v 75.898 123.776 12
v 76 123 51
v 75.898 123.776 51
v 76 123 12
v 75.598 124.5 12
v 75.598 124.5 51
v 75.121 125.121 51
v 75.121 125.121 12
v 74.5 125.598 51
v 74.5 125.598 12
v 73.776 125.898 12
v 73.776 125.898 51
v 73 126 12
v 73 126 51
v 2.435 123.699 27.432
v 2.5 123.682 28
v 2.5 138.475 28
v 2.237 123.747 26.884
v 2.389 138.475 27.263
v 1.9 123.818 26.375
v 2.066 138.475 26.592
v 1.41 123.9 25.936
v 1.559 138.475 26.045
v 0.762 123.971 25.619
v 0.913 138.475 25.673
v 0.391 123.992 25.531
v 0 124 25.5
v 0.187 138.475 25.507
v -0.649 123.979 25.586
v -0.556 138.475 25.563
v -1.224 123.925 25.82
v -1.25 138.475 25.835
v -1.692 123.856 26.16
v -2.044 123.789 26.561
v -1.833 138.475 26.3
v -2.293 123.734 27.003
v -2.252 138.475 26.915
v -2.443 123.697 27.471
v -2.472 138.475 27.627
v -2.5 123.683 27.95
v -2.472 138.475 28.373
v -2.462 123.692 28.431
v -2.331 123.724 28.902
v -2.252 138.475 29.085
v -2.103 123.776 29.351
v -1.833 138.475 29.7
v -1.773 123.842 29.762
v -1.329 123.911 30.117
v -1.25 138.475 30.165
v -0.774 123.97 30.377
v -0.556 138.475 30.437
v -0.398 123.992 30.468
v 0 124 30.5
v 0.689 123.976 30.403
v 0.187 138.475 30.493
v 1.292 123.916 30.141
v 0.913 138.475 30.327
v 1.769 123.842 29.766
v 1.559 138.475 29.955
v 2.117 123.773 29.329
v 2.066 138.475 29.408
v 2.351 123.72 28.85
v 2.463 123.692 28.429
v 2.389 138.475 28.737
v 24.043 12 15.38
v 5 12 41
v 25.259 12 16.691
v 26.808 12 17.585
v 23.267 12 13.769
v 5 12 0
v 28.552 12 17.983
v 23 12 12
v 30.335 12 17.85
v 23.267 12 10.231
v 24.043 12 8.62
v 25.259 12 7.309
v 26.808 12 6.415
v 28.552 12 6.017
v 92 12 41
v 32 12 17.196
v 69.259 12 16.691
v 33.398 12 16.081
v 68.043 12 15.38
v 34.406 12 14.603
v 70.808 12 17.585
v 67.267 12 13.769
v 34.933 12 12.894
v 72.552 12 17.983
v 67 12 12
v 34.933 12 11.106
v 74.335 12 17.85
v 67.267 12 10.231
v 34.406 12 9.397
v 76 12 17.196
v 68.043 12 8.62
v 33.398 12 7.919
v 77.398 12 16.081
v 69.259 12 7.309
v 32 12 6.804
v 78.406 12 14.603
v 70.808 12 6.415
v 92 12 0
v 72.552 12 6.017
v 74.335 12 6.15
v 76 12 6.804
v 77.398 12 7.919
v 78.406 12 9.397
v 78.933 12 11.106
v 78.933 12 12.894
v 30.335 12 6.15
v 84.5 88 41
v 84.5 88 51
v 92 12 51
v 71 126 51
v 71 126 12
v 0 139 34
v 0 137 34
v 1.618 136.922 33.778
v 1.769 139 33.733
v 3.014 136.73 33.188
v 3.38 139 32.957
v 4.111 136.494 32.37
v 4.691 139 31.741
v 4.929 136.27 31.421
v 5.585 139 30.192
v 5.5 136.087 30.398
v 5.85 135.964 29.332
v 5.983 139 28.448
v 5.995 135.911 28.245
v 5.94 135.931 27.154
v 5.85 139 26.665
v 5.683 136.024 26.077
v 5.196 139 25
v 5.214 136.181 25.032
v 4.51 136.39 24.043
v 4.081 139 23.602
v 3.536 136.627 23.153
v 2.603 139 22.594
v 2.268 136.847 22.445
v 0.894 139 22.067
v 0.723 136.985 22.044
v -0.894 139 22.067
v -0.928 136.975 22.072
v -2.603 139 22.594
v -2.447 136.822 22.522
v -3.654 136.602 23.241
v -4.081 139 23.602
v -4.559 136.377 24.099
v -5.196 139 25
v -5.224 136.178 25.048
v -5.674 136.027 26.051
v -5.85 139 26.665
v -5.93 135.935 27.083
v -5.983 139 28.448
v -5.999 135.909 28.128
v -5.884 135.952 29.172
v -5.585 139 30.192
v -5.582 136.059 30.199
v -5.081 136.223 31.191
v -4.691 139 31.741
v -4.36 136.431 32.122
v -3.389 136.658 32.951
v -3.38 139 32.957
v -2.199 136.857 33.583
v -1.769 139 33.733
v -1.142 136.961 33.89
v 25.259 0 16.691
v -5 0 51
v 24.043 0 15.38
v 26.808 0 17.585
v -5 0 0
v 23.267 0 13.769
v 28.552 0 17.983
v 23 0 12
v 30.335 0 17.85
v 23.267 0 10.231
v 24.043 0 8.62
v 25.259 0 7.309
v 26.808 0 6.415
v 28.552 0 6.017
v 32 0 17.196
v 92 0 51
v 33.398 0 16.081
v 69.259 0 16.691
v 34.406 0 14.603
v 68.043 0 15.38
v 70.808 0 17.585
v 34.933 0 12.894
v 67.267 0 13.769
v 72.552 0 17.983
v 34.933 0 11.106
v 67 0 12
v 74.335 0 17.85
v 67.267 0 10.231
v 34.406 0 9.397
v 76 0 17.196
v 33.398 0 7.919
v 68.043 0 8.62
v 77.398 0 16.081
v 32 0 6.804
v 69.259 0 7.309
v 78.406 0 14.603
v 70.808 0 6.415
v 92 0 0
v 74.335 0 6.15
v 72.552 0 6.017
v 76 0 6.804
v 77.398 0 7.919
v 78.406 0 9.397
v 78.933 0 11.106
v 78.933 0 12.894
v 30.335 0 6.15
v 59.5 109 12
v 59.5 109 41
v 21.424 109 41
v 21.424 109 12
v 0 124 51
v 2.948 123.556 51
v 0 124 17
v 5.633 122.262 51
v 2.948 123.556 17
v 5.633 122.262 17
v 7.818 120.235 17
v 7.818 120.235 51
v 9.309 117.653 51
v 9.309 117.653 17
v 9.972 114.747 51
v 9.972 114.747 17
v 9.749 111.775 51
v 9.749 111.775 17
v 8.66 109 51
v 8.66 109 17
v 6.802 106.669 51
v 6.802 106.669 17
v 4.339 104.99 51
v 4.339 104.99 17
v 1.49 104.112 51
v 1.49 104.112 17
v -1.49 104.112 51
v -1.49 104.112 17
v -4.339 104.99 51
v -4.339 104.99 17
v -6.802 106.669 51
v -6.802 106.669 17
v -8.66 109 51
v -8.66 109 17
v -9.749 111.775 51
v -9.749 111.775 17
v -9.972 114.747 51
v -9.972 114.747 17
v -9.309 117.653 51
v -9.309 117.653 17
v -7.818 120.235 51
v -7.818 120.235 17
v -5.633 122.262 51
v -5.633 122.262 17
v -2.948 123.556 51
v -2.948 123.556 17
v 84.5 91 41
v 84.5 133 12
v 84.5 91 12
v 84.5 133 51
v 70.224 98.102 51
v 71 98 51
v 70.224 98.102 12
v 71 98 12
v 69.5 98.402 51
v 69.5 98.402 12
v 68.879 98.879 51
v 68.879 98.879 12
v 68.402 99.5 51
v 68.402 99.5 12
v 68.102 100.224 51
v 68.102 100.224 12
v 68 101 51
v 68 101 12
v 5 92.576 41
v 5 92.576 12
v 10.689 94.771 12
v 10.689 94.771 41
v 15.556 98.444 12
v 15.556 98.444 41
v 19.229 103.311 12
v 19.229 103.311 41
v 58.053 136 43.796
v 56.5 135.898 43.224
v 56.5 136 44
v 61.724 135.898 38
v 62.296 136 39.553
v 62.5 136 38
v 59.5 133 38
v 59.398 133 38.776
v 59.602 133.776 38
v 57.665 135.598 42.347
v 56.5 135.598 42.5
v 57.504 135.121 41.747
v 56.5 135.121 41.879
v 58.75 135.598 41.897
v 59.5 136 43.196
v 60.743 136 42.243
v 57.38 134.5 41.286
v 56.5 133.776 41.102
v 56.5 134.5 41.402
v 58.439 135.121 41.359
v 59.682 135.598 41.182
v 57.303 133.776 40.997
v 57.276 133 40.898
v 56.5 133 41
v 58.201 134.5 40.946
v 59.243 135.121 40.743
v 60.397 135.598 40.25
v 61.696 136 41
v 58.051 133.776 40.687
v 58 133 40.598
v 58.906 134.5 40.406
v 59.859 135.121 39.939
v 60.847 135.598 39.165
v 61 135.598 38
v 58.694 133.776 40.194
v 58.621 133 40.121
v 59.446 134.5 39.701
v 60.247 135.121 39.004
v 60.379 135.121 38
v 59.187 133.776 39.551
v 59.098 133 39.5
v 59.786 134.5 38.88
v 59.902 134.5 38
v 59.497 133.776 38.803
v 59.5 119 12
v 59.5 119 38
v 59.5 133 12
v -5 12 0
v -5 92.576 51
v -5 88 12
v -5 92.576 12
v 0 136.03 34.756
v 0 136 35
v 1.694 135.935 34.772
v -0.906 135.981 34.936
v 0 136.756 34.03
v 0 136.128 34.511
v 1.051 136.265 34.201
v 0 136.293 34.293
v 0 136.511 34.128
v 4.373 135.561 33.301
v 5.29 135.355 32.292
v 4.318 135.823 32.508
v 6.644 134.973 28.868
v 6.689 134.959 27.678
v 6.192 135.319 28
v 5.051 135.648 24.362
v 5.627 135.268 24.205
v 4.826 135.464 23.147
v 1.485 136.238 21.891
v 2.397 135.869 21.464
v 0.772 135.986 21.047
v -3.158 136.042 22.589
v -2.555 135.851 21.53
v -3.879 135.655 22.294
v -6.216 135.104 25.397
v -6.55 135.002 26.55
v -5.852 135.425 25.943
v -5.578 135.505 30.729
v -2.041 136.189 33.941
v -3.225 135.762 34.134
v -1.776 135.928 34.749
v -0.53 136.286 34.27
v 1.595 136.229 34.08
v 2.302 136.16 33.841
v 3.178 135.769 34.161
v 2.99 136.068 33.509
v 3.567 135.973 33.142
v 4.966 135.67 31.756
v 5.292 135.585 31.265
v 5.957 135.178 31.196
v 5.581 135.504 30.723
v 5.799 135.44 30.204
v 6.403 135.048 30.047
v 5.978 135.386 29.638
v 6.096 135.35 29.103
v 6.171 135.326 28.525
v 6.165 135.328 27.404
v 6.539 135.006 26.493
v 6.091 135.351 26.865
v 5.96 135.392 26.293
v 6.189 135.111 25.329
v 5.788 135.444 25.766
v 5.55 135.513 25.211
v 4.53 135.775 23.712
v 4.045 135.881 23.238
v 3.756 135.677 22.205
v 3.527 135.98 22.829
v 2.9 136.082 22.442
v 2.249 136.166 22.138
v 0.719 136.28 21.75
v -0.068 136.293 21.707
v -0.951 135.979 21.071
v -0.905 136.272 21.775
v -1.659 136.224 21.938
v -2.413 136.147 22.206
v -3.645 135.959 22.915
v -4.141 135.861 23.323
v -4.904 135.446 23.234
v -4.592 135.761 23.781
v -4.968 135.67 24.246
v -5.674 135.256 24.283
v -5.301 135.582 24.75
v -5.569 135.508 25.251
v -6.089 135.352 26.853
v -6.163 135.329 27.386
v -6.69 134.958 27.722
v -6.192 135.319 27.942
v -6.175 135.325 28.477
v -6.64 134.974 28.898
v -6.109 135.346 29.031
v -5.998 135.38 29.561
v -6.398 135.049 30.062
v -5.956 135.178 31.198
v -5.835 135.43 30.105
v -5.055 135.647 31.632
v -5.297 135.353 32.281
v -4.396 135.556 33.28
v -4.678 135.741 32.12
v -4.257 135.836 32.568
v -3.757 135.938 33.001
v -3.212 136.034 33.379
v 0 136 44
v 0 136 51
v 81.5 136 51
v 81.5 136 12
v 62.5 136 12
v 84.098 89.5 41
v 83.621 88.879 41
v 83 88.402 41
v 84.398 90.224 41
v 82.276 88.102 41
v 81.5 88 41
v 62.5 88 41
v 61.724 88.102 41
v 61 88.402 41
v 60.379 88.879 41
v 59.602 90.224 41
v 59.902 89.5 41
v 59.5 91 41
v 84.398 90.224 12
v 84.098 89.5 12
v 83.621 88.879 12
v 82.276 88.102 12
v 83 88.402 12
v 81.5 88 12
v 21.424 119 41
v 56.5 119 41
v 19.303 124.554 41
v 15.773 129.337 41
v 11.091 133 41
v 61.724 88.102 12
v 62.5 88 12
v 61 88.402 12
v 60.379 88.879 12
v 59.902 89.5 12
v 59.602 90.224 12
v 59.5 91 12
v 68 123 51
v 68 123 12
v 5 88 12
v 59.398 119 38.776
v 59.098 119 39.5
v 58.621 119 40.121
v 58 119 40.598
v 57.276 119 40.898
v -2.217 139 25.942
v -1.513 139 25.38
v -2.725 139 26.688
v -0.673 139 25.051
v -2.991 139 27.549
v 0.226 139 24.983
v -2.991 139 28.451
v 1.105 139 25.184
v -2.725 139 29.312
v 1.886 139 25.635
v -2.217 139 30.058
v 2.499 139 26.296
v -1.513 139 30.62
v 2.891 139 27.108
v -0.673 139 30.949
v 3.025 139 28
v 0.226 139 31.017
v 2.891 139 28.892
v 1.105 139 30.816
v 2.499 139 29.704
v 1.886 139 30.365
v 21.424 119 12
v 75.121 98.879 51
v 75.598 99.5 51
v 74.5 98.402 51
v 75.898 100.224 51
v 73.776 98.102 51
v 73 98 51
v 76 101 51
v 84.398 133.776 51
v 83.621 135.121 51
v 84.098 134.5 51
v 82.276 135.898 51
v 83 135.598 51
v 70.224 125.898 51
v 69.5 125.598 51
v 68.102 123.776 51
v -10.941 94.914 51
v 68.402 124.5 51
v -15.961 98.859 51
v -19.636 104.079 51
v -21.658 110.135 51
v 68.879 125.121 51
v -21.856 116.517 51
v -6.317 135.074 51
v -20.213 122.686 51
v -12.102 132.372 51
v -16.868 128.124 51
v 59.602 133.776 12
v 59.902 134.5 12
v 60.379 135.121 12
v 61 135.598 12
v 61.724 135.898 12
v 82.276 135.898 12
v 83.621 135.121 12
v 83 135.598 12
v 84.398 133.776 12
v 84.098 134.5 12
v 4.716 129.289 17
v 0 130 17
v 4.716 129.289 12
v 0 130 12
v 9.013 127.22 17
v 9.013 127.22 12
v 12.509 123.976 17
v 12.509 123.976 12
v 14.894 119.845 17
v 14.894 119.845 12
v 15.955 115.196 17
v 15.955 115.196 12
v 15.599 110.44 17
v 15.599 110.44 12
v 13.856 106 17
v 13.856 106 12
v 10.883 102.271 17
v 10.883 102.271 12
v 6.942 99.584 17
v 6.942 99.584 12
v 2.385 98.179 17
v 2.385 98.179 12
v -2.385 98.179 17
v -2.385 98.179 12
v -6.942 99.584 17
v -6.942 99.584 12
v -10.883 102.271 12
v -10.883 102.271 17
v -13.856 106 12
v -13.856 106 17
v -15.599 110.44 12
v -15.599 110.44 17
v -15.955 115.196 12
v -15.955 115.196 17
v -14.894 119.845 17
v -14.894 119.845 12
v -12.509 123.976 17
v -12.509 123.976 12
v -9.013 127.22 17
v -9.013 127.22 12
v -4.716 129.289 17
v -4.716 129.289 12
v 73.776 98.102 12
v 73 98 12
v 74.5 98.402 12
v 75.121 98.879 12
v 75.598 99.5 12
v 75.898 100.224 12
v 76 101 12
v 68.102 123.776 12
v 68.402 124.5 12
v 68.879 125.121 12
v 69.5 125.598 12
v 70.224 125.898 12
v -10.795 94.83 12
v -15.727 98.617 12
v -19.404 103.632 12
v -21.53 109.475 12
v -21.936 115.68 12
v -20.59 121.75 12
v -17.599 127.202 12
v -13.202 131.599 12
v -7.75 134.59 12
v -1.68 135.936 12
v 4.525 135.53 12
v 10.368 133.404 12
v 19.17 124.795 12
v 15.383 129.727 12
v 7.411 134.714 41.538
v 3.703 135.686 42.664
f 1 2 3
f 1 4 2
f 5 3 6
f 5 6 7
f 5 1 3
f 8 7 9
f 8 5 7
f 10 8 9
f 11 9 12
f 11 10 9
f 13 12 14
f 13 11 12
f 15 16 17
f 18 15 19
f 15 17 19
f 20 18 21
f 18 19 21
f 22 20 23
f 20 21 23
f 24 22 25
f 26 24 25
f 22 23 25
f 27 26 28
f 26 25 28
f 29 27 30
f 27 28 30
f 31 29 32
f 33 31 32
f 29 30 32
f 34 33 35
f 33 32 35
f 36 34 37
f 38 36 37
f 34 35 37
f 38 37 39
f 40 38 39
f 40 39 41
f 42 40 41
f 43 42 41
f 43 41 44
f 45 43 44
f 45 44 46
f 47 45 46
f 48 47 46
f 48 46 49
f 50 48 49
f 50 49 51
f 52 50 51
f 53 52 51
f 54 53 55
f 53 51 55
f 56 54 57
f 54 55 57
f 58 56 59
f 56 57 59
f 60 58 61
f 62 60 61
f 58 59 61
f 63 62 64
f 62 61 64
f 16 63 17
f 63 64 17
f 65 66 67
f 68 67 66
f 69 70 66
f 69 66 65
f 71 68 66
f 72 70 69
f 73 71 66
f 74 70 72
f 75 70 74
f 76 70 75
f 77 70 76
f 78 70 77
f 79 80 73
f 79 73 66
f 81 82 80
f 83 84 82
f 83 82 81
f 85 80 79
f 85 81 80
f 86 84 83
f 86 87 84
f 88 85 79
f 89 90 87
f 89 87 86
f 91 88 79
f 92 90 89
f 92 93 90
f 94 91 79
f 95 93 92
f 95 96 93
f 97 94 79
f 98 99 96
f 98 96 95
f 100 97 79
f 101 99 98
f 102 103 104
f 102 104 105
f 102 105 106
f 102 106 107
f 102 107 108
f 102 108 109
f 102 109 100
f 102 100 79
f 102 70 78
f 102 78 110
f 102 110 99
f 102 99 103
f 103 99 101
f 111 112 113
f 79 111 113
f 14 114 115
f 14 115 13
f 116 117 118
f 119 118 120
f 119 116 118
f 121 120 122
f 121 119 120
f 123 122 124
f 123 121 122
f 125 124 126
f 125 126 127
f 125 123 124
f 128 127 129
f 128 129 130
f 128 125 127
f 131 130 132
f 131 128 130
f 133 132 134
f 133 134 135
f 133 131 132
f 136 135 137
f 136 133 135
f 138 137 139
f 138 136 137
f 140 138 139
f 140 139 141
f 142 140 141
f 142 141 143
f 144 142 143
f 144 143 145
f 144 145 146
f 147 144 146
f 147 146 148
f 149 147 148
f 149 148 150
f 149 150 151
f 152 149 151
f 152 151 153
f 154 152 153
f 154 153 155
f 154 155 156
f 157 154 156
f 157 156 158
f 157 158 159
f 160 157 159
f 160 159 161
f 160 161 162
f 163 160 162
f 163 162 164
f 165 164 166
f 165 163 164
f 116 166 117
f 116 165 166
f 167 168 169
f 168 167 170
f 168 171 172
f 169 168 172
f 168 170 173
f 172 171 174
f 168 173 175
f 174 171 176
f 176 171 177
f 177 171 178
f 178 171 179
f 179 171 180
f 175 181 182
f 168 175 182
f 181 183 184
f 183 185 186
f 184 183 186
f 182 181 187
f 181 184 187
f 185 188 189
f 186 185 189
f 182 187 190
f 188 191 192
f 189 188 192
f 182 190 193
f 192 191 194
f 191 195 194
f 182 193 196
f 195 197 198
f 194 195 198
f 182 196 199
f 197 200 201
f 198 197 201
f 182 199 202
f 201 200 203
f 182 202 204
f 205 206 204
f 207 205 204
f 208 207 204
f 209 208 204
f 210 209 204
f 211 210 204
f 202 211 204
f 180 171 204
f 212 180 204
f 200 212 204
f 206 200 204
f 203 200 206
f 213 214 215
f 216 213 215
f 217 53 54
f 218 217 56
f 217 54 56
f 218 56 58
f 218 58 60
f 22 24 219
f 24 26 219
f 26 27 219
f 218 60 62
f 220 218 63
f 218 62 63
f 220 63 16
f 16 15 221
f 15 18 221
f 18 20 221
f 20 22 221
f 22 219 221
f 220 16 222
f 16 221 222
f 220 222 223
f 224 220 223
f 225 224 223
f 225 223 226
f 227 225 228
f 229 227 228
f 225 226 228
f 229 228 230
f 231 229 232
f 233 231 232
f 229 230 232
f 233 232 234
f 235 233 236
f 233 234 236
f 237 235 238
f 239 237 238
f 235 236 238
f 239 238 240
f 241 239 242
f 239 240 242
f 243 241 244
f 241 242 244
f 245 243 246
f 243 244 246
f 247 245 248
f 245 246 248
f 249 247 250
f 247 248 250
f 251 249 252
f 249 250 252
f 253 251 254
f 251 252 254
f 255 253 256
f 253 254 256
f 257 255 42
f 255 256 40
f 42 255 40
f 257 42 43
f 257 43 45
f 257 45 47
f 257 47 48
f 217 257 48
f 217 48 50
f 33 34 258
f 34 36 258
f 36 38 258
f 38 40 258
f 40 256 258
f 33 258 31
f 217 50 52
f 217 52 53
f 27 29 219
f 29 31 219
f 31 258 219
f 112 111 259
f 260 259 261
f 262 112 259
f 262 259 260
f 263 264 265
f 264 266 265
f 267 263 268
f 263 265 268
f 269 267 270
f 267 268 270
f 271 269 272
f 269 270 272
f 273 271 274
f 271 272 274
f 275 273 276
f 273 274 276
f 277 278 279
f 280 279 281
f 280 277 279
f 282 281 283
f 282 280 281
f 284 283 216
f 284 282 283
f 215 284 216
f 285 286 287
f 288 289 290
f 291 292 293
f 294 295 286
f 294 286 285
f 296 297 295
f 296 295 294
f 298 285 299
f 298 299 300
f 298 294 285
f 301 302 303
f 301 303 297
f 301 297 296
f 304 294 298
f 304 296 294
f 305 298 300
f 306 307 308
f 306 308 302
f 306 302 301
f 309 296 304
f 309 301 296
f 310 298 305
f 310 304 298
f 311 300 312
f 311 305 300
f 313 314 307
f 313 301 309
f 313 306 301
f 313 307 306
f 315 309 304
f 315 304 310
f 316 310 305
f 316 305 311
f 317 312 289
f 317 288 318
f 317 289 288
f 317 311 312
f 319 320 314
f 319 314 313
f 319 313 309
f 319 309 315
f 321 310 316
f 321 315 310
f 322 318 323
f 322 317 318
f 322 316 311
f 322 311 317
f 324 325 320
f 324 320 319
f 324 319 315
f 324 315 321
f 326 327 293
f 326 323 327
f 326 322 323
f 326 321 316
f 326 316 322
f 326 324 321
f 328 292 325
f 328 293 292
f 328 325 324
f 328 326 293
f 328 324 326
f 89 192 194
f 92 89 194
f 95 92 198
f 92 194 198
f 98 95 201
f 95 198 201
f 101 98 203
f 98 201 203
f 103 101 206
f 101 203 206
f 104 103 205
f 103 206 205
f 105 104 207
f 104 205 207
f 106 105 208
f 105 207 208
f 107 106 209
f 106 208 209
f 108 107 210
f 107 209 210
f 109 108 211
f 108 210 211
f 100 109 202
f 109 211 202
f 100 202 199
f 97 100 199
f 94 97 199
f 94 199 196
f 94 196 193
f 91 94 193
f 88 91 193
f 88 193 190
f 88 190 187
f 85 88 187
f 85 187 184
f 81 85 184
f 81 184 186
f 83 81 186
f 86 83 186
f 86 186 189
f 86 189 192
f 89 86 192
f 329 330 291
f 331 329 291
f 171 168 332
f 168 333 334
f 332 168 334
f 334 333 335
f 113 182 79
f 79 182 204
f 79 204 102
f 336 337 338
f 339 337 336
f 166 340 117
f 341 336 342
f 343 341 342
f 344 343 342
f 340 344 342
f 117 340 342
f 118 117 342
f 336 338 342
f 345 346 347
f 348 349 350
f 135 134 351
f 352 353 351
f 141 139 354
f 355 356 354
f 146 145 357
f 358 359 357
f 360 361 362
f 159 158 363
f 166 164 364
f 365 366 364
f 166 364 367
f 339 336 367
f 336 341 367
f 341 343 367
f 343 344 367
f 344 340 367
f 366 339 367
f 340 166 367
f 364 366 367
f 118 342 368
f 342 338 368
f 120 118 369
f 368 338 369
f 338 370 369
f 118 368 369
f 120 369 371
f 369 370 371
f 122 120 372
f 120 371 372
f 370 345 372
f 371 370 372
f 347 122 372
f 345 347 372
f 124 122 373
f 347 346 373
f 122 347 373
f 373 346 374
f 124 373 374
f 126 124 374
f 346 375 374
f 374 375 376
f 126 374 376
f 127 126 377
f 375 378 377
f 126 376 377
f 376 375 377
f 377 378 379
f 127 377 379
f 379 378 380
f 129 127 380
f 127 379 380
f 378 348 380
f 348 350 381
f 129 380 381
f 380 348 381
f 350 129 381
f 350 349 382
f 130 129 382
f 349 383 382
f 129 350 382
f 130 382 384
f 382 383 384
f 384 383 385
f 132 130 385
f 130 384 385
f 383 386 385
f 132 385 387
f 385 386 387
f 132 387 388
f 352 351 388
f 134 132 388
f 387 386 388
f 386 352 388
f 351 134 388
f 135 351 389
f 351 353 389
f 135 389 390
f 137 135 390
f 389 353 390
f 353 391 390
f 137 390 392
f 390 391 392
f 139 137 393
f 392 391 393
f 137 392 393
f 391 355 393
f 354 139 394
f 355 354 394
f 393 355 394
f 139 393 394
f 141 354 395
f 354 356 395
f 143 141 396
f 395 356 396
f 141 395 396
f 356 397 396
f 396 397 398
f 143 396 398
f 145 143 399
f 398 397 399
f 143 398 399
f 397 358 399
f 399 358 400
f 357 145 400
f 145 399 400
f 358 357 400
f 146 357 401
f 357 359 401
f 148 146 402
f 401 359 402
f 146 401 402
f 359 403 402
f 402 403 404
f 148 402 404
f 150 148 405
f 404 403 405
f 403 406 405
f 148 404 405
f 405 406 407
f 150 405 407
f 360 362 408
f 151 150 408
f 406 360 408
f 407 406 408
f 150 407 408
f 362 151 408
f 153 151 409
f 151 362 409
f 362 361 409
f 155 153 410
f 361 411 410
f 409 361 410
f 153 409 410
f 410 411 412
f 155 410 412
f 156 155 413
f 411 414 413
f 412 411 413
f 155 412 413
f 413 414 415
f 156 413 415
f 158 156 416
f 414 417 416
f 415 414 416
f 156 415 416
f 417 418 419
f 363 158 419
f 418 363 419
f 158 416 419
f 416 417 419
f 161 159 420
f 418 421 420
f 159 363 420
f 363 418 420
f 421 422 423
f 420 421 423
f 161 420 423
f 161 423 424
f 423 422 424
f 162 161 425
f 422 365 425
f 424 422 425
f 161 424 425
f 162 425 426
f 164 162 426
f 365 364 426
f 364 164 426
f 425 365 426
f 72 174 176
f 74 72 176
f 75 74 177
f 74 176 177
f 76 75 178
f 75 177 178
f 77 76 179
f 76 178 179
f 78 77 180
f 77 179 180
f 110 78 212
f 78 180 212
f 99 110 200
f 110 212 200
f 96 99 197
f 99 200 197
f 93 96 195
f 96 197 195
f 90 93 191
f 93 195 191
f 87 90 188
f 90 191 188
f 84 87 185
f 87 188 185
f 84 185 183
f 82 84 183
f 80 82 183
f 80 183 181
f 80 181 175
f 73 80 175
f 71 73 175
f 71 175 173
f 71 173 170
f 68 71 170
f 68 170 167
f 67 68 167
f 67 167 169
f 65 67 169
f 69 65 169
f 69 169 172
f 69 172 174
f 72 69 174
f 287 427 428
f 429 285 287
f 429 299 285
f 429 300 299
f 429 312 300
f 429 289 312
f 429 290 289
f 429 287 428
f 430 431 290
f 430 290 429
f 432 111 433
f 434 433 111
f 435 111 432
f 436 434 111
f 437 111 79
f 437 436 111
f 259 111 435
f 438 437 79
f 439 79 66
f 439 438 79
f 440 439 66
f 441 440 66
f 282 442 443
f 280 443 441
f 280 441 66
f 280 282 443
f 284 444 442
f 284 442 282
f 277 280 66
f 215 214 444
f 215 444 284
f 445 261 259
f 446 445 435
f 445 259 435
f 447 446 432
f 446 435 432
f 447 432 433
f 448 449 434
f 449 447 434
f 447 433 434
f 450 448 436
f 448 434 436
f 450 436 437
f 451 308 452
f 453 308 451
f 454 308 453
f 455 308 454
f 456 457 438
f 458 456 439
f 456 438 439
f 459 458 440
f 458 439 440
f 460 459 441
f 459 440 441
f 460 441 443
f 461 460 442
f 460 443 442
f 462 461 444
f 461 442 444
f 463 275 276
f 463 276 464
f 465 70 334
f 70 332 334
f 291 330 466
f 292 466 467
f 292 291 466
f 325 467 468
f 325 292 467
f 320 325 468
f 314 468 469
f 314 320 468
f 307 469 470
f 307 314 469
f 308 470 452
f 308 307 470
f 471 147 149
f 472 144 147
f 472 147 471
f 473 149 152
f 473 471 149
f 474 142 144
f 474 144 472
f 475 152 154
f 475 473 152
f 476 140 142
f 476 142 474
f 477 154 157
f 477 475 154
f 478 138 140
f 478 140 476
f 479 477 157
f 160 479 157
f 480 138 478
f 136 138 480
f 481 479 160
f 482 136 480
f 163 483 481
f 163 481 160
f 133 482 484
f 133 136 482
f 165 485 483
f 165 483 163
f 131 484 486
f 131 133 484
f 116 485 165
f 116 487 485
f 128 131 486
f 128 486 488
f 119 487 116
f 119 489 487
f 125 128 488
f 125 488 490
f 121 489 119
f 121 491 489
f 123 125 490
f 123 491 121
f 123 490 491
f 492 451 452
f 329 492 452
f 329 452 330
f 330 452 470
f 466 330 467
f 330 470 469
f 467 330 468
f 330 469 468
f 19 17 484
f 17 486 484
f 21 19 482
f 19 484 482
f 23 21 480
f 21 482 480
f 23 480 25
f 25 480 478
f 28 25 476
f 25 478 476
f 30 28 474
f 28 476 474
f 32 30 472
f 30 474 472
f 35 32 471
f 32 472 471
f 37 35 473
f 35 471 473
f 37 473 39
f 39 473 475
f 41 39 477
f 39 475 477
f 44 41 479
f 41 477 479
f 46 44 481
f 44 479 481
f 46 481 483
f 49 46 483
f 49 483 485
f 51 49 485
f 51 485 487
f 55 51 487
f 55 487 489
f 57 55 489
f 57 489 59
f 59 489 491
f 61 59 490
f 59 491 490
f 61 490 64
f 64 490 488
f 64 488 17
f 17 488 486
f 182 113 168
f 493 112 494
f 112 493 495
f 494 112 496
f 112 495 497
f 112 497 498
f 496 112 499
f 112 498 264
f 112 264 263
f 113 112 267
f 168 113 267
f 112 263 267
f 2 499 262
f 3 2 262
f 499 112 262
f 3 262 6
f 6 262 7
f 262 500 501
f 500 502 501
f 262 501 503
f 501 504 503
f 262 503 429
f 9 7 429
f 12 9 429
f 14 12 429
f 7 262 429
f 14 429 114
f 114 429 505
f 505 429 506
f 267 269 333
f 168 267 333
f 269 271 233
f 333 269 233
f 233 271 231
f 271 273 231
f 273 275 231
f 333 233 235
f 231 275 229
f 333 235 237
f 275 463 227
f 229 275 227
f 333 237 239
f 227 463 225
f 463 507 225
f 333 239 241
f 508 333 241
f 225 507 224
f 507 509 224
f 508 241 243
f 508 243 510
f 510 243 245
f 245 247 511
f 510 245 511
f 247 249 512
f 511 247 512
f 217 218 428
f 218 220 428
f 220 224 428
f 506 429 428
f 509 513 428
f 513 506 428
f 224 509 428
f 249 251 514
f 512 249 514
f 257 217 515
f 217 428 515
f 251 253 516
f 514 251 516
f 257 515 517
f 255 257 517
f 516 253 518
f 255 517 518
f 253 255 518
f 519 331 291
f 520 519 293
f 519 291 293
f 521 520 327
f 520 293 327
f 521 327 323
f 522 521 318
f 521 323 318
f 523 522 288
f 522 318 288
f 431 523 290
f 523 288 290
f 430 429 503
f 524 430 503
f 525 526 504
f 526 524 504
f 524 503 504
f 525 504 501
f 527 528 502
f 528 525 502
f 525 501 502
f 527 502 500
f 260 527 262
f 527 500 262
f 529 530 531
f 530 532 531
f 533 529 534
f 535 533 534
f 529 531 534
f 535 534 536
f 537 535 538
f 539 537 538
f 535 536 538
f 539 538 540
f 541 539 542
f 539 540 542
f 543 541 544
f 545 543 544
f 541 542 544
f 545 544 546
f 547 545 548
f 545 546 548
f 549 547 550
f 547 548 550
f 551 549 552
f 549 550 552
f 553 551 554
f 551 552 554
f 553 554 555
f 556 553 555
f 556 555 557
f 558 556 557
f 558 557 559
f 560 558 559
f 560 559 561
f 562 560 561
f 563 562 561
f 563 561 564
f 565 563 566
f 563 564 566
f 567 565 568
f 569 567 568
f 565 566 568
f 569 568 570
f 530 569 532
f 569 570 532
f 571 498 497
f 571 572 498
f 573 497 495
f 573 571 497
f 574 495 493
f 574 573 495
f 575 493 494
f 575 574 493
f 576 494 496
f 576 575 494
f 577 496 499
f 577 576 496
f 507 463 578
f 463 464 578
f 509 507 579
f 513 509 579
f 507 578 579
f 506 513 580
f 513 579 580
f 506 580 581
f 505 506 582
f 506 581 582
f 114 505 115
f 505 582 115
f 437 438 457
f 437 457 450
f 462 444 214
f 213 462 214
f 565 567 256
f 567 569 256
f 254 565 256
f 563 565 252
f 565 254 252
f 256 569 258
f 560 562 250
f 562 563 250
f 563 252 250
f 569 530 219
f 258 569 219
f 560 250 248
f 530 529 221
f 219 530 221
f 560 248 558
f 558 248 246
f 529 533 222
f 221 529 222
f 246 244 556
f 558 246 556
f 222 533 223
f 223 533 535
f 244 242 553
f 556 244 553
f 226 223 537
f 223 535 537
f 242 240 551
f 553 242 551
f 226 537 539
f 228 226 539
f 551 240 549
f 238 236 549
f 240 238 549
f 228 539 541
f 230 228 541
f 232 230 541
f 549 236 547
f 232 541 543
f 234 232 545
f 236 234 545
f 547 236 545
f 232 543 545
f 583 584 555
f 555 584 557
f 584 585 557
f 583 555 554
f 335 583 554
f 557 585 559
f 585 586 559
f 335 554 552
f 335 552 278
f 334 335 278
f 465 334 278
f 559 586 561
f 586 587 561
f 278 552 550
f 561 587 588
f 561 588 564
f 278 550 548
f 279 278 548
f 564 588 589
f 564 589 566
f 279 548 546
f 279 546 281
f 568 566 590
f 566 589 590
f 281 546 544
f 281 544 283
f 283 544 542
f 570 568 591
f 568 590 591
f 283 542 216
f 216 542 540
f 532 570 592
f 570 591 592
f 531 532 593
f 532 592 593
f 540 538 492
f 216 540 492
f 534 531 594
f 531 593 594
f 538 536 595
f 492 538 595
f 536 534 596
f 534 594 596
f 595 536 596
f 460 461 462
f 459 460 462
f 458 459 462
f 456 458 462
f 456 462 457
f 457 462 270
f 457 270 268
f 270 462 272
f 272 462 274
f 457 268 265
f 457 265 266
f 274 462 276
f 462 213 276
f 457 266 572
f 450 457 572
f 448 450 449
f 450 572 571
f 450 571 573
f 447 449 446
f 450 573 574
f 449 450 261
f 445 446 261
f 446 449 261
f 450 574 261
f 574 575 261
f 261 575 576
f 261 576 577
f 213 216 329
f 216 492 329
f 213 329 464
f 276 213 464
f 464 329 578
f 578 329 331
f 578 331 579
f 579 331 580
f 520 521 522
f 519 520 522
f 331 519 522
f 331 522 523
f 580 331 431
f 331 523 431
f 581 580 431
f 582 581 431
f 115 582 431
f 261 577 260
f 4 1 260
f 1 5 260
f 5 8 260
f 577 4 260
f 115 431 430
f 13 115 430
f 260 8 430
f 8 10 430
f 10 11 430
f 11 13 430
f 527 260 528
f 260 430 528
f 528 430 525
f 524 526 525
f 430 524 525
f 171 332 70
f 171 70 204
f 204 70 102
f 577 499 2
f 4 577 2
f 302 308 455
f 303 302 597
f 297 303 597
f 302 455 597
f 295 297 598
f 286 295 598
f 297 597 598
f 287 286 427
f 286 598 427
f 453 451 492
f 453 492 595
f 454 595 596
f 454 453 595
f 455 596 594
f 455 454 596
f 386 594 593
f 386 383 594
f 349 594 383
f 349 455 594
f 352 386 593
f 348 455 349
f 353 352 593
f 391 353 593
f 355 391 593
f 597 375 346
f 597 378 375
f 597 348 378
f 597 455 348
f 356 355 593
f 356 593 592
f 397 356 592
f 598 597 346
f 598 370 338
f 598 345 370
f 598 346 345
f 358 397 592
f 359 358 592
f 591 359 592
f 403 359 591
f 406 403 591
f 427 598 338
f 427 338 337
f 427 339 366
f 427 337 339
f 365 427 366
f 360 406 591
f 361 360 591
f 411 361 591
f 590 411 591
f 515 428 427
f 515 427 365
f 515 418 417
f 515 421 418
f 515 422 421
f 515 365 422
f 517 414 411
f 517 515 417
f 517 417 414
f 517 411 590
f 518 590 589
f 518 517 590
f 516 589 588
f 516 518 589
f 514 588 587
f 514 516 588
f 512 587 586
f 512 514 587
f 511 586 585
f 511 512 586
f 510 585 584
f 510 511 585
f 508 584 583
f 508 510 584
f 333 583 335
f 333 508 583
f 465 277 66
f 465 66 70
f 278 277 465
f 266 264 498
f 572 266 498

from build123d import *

# Parameters (mm, degrees)
SKETCH1_W                = 92
SKETCH1_H                = 12
BOSS_EXTRUDE1_DEPTH      = 51
SKETCH9_R                = 22
BOSS_EXTRUDE4_DEPTH      = 39
SKETCH9_W                = 25
SKETCH9_H                = 48
SKETCH9_W_2              = 8
SKETCH9_H_2              = 28
BOSS_EXTRUDE4_2_DEPTH    = 39
BOSS_EXTRUDE5_DEPTH      = 5
BOSS_EXTRUDE6_DEPTH      = 10
BOSS_EXTRUDE7_START      = -29
BOSS_EXTRUDE7_DEPTH      = 29
BOSS_EXTRUDE8_REACH      = 176.316
BOSS_EXTRUDE8_END_RADIUS = 22
SKETCH15_R               = 6
FILLET1_R                = 3
FILLET2_R                = 3
FILLET3_R                = 3
FILLET4_R                = 1
HOLE3_D                  = 12
HOLE3_DEPTH              = 12
LPATTERN1_COUNT          = 2
LPATTERN1_PITCH          = 44


# Read off the part's stored shape, not the designer's step: M6 Tapped Hole1
with BuildPart() as part:
    # Sketch1 → Boss-Extrude1 (new body)
    with BuildSketch(Plane.XY):
        with Locations((46, 6)):
            Rectangle(SKETCH1_W, SKETCH1_H)
    extrude(amount=BOSS_EXTRUDE1_DEPTH)



with BuildPart() as body_2:
    # Sketch9 → Boss-Extrude4 (new body)
    with BuildSketch(Plane.XY.offset(51)):
        with Locations((0, 114)):
            Circle(SKETCH9_R)
    extrude(amount=-BOSS_EXTRUDE4_DEPTH)


with BuildPart() as body_3:
    # Sketch9 → Boss-Extrude4 2 (new body)
    with BuildSketch(Plane.XY.offset(51)):
        with Locations((72, 112)):
            Rectangle(SKETCH9_W, SKETCH9_H)
        with Locations((72, 112)):
            Rectangle(SKETCH9_W_2, SKETCH9_H_2, mode=Mode.SUBTRACT)
    extrude(amount=-BOSS_EXTRUDE4_2_DEPTH)


with BuildPart() as part_1:
    add(part.part)

    add(body_2.part)  # Boss-Extrude5 merges body 2
    # Sketch10 → Boss-Extrude5 (add, symmetric)
    with BuildSketch(Plane.ZY):
        Polygon((0, 0), (0, 12), (12, 88), (12, 94), (51, 94), (51, 88), (51, 12), (51, 0), align=None)
    extrude(amount=BOSS_EXTRUDE5_DEPTH, both=True)

    # Sketch12 → Hole2 (revolve, cut)
    with BuildSketch(Plane(origin=(0, 114, 12), x_dir=(0, 1, 0), z_dir=(1, 0, 0))):
        Polygon((0, 0), (0, 39.001), (10, 39.001), (10, 5), (16, 5), (16, 0), align=None)
    revolve(axis=Axis((0, 114, 122), (0, 0, -1)), mode=Mode.SUBTRACT)


    add(body_3.part)  # Boss-Extrude6 merges body 3
    # Sketch13 → Boss-Extrude6 (add)
    with BuildSketch(Plane.XY.offset(51)):
        with BuildLine():
            Line((92, 12), (5, 12))
            Line((5, 12), (5, 92.575714714))
            ThreePointArc((5, 92.575714714), (21.85559741, 116.516517804), (0, 136))
            Line((0, 136), (59.5, 136))
            Line((59.5, 136), (59.5, 88))
            Line((59.5, 88), (84.5, 88))
            Line((84.5, 88), (92, 12))
        make_face()
    extrude(amount=-BOSS_EXTRUDE6_DEPTH)

    # Sketch14 → Boss-Extrude7 (add)
    with BuildSketch(Plane(origin=(0, 0, 12), x_dir=(-1, 0, 0), z_dir=(0, 0, -1)).offset(BOSS_EXTRUDE7_START)):
        with BuildLine():
            Line((-59.5, 119), (-59.5, 109))
            Line((-59.5, 109), (-21.424285286, 109))
            ThreePointArc((-21.424285286, 109), (-22, 114), (-21.424285286, 119))
            Line((-21.424285286, 119), (-59.5, 119))
        make_face()
    extrude(amount=BOSS_EXTRUDE7_DEPTH)

    # Boss-Extrude8: up to this cylinder (the profile starts outside it)
    boss_extrude8_end = Plane(origin=(0, 114, 28), z_dir=(0, 0, 1)) * Cylinder(BOSS_EXTRUDE8_END_RADIUS, 397.632, mode=Mode.PRIVATE)
    # Sketch15 → Boss-Extrude8 (add, up to the surface)
    with BuildSketch(Plane(origin=(0, 139, 0), x_dir=(1, 0, 0), z_dir=(0, 1, 0)), mode=Mode.PRIVATE) as boss_extrude8_sk1:
        with Locations(Location((0, -28, 0), (0, 0, 270))):
            Circle(SKETCH15_R)
    boss_extrude8_tool1 = extrude(boss_extrude8_sk1.sketch, amount=-BOSS_EXTRUDE8_REACH, mode=Mode.PRIVATE) - boss_extrude8_end
    add(boss_extrude8_tool1.solids().sort_by_distance((0, 139, 28))[0])

    # M6 Tapped Hole1 outline → M6 Tapped Hole1 (revolve, cut)
    with BuildSketch(Plane.XY.offset(28)):
        Polygon((0, 123.682411551), (2.5, 123.682411551), (2.5, 138.475), (3.025, 139), (0, 139), align=None)
    revolve(axis=Axis((0, 0, 28), (0, 1, 0)), mode=Mode.SUBTRACT)

    # Fillet1
    # the kernel refuses this fillet: 3 mm, written as the material it adds along each edge
    with BuildSketch(Plane(origin=(59.5, 136, 41), x_dir=(-1, 0, 0), z_dir=(0, -1, 0))) as fillet1_piece_1:
        with BuildLine():
            CenterArc((FILLET1_R, FILLET1_R), FILLET1_R, 180, 90)
            Line((0, FILLET1_R), (0, 0))
            Line((0, 0), (FILLET1_R, 0))
        make_face()
    extrude(amount=24.5)
    # the kernel refuses this fillet: 3 mm, written as the material it takes off along each edge
    with BuildSketch(Plane(origin=(59.5, 88, 41), x_dir=(0, 1, 0), z_dir=(0, 0, -1))) as fillet1_2_piece_1:
        with BuildLine():
            CenterArc((FILLET1_R, FILLET1_R), FILLET1_R, 180, 90)
            Line((0, FILLET1_R), (0, 0))
            Line((0, 0), (FILLET1_R, 0))
        make_face()
    extrude(amount=36.5, mode=Mode.SUBTRACT)
    # the kernel refuses this fillet: 3 mm, written as the material it takes off along each edge
    with BuildSketch(Plane(origin=(-7.5, 136, 41), x_dir=(0, 0, 1), z_dir=(1, 0, 0))) as fillet1_3_piece_1_section:
        with BuildLine():
            CenterArc((FILLET1_R, FILLET1_R), FILLET1_R, 180, 90)
            Line((0, FILLET1_R), (0, 0))
            Line((0, 0), (FILLET1_R, 0))
        make_face()
    fillet1_3_piece_1 = extrude(amount=64, mode=Mode.PRIVATE)
    fillet1_3_piece_1 = fillet1_3_piece_1 - Plane(origin=(0, 114, 41.685678885), x_dir=(1, 0, 0), z_dir=(0, 0, 1)) * Cylinder(22, 140, mode=Mode.PRIVATE)
    add(fillet1_3_piece_1, mode=Mode.SUBTRACT)
    with BuildSketch(Plane(origin=(59.5, 136, 38), x_dir=(1, 0, 0), z_dir=(0, 0, -1))) as fillet1_3_piece_2:
        with BuildLine():
            CenterArc((FILLET1_R, FILLET1_R), FILLET1_R, 180, 90)
            Line((0, FILLET1_R), (0, 0))
            Line((0, 0), (FILLET1_R, 0))
        make_face()
    extrude(amount=33.5, mode=Mode.SUBTRACT)
    with BuildSketch(Plane(origin=(56.5, 136, 38), x_dir=(0, 0, 1), z_dir=(-1, 0, 0))) as fillet1_3_piece_3:
        with BuildLine():
            CenterArc((3 + FILLET1_R, -FILLET1_R), FILLET1_R, 90, 90)
            Line((3, -FILLET1_R), (3, 0))
            Line((3, 0), (3 + FILLET1_R, 0))
        make_face()
    revolve(axis=Axis((56.5, 136, 38), (0, 1, 0)), revolution_arc=90, mode=Mode.SUBTRACT)

    # Fillet2
    fillet2_edges = [part_1.edges().sort_by_distance(p)[0] for p in [
        (68, 98, 31.5),
        (76, 98, 31.5),
        (76, 126, 31.5),
        (68, 126, 31.5),
    ]]
    fillet(fillet2_edges, radius=FILLET2_R)

    # Fillet3
    # the kernel refuses this fillet: 3 mm, written as the material it takes off along each edge
    with BuildSketch(Plane(origin=(84.5, 136, 58.5), x_dir=(-1, 0, 0), z_dir=(0, 0, -1))) as fillet3_piece_1:
        with BuildLine():
            CenterArc((FILLET3_R, -FILLET3_R), FILLET3_R, 90, 90)
            Line((0, -FILLET3_R), (0, 0))
            Line((0, 0), (FILLET3_R, 0))
        make_face()
    extrude(amount=54, mode=Mode.SUBTRACT)
    with BuildSketch(Plane(origin=(84.5, 88, 41), x_dir=(0, 1, 0), z_dir=(0, 0, -1))) as fillet3_piece_2:
        with BuildLine():
            CenterArc((FILLET3_R, -FILLET3_R), FILLET3_R, 90, 90)
            Line((0, -FILLET3_R), (0, 0))
            Line((0, 0), (FILLET3_R, 0))
        make_face()
    extrude(amount=36.5, mode=Mode.SUBTRACT)

    # Fillet4
    fillet4_edges = [part_1.edges().sort_by_distance(p)[0] for p in [
        (1e-09, 135.999999999, 21.999999993),
    ]]
    fillet(fillet4_edges, radius=FILLET4_R)

    # Hole3
    with Locations(Plane(origin=(0, 12, 0), x_dir=(1, 0, 0), z_dir=(0, 1, 0))):
        with Locations((73, -12)):
            hole3 = Hole(HOLE3_D / 2, depth=HOLE3_DEPTH)

    # LPattern1: Hole3 ×2
    with Locations(*[(-i * LPATTERN1_PITCH, 0, 0) for i in range(1, LPATTERN1_COUNT)]):
        add(hole3, mode=Mode.SUBTRACT)


solid = part_1.part
